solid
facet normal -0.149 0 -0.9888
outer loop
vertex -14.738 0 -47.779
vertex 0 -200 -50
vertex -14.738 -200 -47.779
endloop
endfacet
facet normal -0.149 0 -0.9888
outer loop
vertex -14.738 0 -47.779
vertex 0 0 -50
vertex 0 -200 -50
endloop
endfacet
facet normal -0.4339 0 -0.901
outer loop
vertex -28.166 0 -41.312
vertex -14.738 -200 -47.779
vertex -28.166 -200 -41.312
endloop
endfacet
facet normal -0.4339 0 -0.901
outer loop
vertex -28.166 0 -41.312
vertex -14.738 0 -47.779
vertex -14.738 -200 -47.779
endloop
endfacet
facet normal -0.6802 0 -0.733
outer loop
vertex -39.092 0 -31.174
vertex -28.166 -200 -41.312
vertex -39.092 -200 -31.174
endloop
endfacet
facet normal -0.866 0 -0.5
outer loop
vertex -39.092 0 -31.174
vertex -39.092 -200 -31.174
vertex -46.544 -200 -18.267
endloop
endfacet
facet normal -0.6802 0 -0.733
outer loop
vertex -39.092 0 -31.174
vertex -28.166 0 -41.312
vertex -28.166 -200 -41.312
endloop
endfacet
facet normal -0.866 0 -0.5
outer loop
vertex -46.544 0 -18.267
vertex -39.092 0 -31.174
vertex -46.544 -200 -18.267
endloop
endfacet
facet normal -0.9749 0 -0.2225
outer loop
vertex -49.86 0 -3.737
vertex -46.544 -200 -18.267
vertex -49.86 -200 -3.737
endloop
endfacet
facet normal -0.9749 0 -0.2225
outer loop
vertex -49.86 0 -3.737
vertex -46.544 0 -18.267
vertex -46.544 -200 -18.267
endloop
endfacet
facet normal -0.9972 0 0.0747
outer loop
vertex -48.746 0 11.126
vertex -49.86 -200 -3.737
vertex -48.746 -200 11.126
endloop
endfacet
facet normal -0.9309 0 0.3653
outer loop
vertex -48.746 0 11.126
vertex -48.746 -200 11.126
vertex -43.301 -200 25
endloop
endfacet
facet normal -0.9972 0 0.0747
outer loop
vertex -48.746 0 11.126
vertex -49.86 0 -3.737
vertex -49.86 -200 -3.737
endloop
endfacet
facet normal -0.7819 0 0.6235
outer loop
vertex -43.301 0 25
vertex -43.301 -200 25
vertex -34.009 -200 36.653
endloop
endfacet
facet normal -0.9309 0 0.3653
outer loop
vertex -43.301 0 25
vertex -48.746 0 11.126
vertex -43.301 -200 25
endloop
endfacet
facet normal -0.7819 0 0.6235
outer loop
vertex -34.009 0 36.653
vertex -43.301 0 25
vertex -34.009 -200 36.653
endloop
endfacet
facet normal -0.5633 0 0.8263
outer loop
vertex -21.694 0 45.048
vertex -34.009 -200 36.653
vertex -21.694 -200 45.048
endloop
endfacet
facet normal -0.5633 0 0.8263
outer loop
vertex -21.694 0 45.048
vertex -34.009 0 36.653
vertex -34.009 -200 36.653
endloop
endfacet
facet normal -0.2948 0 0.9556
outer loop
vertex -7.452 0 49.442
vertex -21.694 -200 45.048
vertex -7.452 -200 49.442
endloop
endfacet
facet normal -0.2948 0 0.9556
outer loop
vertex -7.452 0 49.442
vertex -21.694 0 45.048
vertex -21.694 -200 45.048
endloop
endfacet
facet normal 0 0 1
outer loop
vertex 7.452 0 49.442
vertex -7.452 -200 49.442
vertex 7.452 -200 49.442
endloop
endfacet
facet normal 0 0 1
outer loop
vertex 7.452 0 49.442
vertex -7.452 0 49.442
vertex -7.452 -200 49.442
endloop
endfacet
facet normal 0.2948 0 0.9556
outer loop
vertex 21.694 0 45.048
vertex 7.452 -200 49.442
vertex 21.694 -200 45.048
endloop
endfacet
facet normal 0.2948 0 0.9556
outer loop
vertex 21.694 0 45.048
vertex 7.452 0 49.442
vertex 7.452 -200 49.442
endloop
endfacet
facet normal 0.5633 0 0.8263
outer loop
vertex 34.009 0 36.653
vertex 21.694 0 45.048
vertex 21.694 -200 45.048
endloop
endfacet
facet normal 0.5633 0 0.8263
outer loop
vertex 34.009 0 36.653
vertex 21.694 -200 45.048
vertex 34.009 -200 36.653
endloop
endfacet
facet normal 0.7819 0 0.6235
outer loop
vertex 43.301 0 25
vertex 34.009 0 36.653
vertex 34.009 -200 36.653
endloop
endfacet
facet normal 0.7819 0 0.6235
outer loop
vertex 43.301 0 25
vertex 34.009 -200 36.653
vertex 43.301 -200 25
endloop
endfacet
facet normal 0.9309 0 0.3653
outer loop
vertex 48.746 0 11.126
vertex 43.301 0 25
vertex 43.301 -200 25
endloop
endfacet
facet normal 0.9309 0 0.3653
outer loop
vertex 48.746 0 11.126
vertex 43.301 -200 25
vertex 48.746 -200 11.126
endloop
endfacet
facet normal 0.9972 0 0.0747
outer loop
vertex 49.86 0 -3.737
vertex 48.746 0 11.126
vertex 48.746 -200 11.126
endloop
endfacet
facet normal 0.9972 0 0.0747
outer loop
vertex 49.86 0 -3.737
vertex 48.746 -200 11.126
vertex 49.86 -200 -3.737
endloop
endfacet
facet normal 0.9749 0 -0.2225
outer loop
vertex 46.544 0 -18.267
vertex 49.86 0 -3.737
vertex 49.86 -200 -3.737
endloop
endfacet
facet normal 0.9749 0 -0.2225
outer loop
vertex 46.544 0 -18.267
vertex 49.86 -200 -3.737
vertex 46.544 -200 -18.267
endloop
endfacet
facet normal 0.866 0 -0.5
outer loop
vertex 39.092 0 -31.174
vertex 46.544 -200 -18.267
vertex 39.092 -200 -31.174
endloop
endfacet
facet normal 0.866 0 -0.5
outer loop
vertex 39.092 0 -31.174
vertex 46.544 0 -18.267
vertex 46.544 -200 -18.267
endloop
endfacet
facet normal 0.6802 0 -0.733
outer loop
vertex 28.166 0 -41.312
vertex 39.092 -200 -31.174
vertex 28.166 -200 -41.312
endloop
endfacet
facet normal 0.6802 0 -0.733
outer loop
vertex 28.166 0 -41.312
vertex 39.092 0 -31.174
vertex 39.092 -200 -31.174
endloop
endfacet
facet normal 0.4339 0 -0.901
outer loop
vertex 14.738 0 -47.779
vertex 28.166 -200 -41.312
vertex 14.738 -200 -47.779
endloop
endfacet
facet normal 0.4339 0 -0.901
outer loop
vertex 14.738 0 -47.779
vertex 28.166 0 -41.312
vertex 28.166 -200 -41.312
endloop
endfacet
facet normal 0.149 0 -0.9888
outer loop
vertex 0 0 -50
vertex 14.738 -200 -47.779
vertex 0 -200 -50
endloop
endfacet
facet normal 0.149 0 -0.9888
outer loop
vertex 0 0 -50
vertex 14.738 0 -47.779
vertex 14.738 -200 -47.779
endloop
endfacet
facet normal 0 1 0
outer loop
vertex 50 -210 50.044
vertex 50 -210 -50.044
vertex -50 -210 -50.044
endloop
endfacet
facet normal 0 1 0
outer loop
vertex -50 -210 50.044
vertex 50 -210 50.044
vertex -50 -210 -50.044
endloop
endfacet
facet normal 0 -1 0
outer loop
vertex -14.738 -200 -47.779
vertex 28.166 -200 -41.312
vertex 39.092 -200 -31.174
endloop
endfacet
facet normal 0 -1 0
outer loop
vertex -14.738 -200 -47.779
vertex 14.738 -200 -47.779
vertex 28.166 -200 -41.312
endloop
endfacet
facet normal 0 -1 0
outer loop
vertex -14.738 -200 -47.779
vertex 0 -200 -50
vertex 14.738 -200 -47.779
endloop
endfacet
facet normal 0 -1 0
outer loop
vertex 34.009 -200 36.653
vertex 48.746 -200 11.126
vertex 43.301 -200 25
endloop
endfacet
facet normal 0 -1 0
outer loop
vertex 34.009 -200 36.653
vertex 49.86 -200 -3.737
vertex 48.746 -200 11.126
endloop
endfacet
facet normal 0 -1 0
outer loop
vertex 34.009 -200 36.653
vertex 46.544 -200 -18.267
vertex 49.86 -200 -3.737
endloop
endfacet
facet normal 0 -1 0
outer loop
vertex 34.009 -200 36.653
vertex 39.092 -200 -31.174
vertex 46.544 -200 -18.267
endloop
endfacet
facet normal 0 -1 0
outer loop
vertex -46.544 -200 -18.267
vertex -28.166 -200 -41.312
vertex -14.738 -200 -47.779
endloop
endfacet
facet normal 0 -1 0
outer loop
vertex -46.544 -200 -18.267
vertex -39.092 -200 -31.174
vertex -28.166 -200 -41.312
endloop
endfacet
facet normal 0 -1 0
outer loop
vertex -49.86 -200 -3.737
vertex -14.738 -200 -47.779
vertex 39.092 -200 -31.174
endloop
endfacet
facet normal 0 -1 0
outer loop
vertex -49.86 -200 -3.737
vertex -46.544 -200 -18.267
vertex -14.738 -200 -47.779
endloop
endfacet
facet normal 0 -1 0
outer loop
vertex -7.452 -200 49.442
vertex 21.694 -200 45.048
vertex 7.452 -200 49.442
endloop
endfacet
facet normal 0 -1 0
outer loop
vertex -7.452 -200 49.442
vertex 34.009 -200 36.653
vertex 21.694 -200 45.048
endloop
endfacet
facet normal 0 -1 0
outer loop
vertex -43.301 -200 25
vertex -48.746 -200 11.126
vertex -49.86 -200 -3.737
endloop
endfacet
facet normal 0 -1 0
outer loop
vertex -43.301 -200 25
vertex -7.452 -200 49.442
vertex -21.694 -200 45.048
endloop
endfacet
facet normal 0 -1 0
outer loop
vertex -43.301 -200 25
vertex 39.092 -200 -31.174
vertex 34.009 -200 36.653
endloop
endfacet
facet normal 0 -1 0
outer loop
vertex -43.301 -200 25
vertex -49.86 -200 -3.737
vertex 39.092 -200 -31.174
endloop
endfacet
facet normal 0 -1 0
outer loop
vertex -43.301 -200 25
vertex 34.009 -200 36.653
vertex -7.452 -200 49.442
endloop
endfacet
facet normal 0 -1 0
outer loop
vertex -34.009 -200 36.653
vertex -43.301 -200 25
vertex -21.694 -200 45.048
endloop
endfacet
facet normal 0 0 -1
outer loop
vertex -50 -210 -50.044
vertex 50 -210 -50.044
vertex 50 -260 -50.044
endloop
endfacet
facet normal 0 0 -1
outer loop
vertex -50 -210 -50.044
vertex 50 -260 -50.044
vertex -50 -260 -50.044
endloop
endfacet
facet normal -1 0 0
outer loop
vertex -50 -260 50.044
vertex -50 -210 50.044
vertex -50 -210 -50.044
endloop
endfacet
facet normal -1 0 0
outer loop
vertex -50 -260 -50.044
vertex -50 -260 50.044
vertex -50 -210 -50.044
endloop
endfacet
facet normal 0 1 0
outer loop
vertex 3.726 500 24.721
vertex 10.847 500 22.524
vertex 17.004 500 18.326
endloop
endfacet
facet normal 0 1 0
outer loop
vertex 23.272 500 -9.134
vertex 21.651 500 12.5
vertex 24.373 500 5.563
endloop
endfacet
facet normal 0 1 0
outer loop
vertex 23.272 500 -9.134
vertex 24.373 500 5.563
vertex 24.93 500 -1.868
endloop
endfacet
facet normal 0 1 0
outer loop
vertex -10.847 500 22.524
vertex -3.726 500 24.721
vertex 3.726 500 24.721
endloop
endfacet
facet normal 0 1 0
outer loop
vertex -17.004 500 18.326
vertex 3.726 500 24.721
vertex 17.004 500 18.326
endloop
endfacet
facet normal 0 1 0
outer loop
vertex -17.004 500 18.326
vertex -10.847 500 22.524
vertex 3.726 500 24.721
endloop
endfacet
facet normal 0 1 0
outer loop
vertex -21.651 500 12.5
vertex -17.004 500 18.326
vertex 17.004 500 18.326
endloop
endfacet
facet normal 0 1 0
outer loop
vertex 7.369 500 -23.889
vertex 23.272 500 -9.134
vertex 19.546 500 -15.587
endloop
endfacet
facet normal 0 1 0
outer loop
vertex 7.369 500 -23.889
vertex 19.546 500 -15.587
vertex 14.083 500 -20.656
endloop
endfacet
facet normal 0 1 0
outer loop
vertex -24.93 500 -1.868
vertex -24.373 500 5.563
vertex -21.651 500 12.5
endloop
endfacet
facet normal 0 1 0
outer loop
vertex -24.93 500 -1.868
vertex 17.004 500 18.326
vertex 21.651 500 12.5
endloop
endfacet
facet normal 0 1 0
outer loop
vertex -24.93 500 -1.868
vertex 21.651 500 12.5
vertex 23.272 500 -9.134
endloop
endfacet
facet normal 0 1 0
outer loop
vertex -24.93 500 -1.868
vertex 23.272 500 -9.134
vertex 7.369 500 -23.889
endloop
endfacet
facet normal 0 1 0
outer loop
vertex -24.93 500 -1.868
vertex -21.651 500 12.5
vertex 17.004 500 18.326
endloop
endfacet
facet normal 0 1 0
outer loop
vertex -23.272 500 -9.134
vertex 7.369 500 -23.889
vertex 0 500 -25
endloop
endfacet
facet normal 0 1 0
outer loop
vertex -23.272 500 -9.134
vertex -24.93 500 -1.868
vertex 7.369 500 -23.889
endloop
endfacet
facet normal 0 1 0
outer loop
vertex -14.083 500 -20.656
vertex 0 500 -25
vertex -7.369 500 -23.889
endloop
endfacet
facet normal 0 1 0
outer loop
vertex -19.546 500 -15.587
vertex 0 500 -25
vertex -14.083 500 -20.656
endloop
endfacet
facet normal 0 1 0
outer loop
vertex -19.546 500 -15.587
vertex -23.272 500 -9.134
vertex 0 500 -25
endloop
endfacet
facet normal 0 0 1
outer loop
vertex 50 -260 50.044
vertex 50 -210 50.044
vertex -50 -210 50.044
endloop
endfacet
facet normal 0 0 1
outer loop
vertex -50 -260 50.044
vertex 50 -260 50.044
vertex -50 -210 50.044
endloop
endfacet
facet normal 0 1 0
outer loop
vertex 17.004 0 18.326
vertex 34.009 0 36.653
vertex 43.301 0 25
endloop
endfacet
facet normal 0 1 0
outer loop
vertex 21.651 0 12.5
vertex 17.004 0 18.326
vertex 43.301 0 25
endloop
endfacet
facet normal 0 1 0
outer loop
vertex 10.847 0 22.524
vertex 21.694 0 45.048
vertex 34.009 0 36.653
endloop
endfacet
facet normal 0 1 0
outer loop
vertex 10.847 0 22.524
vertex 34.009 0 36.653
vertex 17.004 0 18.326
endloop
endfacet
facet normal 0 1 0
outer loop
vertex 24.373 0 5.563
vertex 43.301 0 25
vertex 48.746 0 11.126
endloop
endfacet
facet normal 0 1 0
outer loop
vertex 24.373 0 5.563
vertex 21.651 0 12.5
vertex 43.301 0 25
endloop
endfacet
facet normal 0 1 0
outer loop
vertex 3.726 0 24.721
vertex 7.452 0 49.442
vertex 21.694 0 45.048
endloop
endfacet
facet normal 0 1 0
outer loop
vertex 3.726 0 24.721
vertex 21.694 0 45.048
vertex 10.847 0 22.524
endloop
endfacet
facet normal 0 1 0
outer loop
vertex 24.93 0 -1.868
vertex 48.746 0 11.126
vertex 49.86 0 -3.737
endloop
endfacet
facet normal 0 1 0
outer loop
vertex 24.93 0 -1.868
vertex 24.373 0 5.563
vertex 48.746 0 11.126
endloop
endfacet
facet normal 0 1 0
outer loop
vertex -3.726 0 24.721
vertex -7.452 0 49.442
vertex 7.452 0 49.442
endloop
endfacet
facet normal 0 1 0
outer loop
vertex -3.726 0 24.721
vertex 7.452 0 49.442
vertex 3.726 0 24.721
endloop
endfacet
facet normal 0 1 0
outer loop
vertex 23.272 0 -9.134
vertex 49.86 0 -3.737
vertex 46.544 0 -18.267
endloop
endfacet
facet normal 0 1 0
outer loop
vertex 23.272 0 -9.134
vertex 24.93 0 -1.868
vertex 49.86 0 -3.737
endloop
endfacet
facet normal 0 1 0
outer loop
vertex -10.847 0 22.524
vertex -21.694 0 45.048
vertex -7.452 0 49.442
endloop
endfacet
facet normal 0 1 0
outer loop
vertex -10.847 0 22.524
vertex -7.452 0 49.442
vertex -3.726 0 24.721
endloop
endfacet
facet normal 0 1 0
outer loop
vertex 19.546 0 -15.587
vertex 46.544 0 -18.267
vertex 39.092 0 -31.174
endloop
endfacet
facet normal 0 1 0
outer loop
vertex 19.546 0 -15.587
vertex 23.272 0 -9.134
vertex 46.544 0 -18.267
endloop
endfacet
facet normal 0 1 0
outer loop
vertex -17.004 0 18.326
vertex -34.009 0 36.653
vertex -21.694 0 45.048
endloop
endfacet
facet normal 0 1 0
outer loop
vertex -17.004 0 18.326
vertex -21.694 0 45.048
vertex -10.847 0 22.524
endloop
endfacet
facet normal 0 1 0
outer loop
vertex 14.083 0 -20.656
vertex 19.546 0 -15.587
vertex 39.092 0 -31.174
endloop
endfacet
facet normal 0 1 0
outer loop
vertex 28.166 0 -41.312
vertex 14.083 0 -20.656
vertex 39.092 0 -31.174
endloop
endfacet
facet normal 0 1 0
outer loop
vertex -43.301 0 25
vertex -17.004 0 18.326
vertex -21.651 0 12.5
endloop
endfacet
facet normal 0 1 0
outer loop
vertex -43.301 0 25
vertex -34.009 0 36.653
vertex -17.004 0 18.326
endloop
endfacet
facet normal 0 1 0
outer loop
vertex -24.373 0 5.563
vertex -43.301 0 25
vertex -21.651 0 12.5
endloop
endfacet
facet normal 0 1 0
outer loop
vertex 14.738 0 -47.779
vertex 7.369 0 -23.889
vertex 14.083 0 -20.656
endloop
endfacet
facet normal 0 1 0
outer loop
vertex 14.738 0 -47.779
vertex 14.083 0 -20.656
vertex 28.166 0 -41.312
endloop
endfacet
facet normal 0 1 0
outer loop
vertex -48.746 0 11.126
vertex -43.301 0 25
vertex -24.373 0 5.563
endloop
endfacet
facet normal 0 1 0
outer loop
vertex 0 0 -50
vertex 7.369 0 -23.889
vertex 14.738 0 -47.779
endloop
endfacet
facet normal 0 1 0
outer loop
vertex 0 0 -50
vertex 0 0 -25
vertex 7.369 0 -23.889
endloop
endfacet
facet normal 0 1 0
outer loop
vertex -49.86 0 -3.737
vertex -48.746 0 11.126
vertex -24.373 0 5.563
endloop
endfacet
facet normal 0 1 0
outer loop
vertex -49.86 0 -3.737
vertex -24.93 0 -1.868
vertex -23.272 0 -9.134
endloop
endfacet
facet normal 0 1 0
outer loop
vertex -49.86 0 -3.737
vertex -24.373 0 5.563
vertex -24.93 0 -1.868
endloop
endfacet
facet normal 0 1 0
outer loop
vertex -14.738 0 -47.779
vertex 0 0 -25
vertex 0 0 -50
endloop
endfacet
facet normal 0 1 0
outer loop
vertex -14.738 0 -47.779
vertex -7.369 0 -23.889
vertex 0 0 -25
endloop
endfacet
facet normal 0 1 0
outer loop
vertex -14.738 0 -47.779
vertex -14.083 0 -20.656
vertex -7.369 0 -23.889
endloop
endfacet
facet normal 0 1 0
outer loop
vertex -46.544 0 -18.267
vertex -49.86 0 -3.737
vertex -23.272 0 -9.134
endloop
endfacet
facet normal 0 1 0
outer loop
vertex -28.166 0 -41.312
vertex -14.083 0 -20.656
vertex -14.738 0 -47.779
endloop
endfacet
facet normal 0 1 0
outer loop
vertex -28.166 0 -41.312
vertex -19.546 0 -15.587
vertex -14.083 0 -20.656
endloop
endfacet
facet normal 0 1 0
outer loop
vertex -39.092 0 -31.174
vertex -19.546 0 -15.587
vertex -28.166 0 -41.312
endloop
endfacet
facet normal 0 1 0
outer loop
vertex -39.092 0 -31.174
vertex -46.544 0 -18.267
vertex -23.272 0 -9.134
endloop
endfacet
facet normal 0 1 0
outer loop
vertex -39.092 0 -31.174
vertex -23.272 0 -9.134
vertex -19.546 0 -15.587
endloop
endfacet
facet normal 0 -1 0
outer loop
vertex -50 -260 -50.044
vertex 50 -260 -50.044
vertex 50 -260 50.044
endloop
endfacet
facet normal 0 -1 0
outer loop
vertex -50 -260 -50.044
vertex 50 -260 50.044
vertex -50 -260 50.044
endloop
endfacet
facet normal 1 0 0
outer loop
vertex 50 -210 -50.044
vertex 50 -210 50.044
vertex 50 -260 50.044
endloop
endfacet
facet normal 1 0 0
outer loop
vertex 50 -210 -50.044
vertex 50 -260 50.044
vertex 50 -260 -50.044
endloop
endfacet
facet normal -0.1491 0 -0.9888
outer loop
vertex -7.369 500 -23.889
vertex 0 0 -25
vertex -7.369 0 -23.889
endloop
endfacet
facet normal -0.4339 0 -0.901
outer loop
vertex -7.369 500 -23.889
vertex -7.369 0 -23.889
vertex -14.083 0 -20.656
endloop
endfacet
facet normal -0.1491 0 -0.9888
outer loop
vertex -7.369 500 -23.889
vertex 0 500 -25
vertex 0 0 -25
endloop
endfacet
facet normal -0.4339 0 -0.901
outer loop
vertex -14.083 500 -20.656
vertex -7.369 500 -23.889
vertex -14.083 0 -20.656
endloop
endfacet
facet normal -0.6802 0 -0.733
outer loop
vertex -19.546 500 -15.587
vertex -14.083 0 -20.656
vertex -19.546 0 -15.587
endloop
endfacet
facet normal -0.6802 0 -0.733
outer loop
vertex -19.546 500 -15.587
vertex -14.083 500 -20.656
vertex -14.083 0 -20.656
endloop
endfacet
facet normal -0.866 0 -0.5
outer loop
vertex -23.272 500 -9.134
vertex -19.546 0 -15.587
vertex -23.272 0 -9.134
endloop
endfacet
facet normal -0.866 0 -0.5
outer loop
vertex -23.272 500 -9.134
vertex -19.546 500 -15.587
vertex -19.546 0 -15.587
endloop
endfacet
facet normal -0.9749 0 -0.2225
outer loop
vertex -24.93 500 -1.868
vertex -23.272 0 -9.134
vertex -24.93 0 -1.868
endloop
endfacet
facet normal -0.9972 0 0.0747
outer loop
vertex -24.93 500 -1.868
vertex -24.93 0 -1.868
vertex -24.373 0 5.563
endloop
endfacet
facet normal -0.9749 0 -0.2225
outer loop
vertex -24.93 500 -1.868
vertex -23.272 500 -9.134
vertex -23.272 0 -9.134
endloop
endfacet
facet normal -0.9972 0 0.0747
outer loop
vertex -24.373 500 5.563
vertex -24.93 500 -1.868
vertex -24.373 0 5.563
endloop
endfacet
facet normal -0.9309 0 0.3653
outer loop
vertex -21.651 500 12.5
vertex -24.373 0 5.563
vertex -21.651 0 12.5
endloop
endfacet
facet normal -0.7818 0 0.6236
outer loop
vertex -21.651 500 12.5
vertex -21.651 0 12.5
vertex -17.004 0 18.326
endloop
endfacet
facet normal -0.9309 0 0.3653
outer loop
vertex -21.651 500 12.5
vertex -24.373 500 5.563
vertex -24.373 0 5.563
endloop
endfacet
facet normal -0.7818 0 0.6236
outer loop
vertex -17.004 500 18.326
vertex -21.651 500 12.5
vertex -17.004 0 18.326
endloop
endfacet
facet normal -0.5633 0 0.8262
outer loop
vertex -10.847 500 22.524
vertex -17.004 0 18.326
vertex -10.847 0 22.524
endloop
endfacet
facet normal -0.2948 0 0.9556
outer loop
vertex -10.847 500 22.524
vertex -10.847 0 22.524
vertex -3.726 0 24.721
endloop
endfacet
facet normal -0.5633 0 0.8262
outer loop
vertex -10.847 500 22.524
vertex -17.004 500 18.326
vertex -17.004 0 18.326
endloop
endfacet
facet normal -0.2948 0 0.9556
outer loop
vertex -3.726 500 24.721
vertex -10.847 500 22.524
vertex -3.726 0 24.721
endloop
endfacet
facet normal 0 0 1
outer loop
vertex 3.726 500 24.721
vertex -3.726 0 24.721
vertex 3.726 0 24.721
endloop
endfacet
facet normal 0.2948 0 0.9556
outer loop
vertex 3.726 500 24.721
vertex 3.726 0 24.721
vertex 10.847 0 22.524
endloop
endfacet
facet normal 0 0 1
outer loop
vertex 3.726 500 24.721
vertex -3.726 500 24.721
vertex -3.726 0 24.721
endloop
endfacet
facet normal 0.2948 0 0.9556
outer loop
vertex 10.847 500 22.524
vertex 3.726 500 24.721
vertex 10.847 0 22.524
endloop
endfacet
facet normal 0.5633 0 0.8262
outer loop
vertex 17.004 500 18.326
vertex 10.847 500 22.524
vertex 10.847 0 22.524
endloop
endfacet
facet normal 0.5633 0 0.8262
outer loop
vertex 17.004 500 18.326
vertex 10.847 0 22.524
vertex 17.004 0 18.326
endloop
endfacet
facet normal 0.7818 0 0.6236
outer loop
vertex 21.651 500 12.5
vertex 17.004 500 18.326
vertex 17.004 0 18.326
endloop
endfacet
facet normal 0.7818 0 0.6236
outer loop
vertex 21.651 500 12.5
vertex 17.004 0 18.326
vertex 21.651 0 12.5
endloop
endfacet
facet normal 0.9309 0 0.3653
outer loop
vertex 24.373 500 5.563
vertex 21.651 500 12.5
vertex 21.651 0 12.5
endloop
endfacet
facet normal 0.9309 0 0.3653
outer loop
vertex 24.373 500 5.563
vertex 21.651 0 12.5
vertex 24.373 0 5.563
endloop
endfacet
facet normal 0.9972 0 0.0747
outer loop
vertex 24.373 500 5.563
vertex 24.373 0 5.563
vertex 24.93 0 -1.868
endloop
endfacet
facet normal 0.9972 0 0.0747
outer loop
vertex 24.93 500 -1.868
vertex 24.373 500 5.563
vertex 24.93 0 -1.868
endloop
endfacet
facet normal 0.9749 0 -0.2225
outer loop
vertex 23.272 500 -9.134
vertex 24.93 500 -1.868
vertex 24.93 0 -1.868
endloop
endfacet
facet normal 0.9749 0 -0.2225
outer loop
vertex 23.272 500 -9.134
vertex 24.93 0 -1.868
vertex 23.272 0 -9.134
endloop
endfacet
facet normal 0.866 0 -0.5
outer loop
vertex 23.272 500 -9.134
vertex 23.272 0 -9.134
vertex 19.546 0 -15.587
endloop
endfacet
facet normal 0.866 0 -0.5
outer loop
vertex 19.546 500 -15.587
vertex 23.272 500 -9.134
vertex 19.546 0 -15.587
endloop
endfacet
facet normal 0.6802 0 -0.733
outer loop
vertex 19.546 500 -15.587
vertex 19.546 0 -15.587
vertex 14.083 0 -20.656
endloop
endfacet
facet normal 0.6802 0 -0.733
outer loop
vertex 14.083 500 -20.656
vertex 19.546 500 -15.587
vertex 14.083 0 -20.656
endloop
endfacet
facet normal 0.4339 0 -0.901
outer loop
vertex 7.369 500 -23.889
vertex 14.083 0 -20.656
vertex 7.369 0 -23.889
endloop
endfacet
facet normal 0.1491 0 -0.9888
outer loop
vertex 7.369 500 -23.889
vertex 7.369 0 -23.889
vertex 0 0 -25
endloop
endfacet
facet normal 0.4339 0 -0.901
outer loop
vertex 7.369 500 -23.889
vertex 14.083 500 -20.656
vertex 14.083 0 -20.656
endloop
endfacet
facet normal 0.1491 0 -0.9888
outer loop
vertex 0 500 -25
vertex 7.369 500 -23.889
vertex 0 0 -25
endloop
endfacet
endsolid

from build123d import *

# Parameters (mm, degrees)
SKETCH_2_W      = 100
SKETCH_2_H      = 100.088773616
EXTRUDE_1_DEPTH = 50


with BuildPart() as part:
    # 草图1 → 旋转1 (revolve)
    with BuildSketch(Plane.XY, mode=Mode.PRIVATE) as revolve_1_sk:
        Polygon((-25, 0), (-25, 500), (0, 500), (0, 0), (0, -200), (-50, -200), (-50, 0), align=None)
    revolve(revolve_1_sk.sketch.rotate(Axis((0, 0, 0), (0, 1, 0)), 270), axis=Axis((0, 0, 0), (0, 1, 0)))


with BuildPart() as body_2:
    # 草图2 → 凸台-拉伸1 (new body)
    with BuildSketch(Plane(origin=(0, -210, 0), x_dir=(-1, 0, 0), z_dir=(0, -1, 0))):
        Rectangle(SKETCH_2_W, SKETCH_2_H)
    extrude(amount=EXTRUDE_1_DEPTH)


solid = Compound([part.part, body_2.part])
